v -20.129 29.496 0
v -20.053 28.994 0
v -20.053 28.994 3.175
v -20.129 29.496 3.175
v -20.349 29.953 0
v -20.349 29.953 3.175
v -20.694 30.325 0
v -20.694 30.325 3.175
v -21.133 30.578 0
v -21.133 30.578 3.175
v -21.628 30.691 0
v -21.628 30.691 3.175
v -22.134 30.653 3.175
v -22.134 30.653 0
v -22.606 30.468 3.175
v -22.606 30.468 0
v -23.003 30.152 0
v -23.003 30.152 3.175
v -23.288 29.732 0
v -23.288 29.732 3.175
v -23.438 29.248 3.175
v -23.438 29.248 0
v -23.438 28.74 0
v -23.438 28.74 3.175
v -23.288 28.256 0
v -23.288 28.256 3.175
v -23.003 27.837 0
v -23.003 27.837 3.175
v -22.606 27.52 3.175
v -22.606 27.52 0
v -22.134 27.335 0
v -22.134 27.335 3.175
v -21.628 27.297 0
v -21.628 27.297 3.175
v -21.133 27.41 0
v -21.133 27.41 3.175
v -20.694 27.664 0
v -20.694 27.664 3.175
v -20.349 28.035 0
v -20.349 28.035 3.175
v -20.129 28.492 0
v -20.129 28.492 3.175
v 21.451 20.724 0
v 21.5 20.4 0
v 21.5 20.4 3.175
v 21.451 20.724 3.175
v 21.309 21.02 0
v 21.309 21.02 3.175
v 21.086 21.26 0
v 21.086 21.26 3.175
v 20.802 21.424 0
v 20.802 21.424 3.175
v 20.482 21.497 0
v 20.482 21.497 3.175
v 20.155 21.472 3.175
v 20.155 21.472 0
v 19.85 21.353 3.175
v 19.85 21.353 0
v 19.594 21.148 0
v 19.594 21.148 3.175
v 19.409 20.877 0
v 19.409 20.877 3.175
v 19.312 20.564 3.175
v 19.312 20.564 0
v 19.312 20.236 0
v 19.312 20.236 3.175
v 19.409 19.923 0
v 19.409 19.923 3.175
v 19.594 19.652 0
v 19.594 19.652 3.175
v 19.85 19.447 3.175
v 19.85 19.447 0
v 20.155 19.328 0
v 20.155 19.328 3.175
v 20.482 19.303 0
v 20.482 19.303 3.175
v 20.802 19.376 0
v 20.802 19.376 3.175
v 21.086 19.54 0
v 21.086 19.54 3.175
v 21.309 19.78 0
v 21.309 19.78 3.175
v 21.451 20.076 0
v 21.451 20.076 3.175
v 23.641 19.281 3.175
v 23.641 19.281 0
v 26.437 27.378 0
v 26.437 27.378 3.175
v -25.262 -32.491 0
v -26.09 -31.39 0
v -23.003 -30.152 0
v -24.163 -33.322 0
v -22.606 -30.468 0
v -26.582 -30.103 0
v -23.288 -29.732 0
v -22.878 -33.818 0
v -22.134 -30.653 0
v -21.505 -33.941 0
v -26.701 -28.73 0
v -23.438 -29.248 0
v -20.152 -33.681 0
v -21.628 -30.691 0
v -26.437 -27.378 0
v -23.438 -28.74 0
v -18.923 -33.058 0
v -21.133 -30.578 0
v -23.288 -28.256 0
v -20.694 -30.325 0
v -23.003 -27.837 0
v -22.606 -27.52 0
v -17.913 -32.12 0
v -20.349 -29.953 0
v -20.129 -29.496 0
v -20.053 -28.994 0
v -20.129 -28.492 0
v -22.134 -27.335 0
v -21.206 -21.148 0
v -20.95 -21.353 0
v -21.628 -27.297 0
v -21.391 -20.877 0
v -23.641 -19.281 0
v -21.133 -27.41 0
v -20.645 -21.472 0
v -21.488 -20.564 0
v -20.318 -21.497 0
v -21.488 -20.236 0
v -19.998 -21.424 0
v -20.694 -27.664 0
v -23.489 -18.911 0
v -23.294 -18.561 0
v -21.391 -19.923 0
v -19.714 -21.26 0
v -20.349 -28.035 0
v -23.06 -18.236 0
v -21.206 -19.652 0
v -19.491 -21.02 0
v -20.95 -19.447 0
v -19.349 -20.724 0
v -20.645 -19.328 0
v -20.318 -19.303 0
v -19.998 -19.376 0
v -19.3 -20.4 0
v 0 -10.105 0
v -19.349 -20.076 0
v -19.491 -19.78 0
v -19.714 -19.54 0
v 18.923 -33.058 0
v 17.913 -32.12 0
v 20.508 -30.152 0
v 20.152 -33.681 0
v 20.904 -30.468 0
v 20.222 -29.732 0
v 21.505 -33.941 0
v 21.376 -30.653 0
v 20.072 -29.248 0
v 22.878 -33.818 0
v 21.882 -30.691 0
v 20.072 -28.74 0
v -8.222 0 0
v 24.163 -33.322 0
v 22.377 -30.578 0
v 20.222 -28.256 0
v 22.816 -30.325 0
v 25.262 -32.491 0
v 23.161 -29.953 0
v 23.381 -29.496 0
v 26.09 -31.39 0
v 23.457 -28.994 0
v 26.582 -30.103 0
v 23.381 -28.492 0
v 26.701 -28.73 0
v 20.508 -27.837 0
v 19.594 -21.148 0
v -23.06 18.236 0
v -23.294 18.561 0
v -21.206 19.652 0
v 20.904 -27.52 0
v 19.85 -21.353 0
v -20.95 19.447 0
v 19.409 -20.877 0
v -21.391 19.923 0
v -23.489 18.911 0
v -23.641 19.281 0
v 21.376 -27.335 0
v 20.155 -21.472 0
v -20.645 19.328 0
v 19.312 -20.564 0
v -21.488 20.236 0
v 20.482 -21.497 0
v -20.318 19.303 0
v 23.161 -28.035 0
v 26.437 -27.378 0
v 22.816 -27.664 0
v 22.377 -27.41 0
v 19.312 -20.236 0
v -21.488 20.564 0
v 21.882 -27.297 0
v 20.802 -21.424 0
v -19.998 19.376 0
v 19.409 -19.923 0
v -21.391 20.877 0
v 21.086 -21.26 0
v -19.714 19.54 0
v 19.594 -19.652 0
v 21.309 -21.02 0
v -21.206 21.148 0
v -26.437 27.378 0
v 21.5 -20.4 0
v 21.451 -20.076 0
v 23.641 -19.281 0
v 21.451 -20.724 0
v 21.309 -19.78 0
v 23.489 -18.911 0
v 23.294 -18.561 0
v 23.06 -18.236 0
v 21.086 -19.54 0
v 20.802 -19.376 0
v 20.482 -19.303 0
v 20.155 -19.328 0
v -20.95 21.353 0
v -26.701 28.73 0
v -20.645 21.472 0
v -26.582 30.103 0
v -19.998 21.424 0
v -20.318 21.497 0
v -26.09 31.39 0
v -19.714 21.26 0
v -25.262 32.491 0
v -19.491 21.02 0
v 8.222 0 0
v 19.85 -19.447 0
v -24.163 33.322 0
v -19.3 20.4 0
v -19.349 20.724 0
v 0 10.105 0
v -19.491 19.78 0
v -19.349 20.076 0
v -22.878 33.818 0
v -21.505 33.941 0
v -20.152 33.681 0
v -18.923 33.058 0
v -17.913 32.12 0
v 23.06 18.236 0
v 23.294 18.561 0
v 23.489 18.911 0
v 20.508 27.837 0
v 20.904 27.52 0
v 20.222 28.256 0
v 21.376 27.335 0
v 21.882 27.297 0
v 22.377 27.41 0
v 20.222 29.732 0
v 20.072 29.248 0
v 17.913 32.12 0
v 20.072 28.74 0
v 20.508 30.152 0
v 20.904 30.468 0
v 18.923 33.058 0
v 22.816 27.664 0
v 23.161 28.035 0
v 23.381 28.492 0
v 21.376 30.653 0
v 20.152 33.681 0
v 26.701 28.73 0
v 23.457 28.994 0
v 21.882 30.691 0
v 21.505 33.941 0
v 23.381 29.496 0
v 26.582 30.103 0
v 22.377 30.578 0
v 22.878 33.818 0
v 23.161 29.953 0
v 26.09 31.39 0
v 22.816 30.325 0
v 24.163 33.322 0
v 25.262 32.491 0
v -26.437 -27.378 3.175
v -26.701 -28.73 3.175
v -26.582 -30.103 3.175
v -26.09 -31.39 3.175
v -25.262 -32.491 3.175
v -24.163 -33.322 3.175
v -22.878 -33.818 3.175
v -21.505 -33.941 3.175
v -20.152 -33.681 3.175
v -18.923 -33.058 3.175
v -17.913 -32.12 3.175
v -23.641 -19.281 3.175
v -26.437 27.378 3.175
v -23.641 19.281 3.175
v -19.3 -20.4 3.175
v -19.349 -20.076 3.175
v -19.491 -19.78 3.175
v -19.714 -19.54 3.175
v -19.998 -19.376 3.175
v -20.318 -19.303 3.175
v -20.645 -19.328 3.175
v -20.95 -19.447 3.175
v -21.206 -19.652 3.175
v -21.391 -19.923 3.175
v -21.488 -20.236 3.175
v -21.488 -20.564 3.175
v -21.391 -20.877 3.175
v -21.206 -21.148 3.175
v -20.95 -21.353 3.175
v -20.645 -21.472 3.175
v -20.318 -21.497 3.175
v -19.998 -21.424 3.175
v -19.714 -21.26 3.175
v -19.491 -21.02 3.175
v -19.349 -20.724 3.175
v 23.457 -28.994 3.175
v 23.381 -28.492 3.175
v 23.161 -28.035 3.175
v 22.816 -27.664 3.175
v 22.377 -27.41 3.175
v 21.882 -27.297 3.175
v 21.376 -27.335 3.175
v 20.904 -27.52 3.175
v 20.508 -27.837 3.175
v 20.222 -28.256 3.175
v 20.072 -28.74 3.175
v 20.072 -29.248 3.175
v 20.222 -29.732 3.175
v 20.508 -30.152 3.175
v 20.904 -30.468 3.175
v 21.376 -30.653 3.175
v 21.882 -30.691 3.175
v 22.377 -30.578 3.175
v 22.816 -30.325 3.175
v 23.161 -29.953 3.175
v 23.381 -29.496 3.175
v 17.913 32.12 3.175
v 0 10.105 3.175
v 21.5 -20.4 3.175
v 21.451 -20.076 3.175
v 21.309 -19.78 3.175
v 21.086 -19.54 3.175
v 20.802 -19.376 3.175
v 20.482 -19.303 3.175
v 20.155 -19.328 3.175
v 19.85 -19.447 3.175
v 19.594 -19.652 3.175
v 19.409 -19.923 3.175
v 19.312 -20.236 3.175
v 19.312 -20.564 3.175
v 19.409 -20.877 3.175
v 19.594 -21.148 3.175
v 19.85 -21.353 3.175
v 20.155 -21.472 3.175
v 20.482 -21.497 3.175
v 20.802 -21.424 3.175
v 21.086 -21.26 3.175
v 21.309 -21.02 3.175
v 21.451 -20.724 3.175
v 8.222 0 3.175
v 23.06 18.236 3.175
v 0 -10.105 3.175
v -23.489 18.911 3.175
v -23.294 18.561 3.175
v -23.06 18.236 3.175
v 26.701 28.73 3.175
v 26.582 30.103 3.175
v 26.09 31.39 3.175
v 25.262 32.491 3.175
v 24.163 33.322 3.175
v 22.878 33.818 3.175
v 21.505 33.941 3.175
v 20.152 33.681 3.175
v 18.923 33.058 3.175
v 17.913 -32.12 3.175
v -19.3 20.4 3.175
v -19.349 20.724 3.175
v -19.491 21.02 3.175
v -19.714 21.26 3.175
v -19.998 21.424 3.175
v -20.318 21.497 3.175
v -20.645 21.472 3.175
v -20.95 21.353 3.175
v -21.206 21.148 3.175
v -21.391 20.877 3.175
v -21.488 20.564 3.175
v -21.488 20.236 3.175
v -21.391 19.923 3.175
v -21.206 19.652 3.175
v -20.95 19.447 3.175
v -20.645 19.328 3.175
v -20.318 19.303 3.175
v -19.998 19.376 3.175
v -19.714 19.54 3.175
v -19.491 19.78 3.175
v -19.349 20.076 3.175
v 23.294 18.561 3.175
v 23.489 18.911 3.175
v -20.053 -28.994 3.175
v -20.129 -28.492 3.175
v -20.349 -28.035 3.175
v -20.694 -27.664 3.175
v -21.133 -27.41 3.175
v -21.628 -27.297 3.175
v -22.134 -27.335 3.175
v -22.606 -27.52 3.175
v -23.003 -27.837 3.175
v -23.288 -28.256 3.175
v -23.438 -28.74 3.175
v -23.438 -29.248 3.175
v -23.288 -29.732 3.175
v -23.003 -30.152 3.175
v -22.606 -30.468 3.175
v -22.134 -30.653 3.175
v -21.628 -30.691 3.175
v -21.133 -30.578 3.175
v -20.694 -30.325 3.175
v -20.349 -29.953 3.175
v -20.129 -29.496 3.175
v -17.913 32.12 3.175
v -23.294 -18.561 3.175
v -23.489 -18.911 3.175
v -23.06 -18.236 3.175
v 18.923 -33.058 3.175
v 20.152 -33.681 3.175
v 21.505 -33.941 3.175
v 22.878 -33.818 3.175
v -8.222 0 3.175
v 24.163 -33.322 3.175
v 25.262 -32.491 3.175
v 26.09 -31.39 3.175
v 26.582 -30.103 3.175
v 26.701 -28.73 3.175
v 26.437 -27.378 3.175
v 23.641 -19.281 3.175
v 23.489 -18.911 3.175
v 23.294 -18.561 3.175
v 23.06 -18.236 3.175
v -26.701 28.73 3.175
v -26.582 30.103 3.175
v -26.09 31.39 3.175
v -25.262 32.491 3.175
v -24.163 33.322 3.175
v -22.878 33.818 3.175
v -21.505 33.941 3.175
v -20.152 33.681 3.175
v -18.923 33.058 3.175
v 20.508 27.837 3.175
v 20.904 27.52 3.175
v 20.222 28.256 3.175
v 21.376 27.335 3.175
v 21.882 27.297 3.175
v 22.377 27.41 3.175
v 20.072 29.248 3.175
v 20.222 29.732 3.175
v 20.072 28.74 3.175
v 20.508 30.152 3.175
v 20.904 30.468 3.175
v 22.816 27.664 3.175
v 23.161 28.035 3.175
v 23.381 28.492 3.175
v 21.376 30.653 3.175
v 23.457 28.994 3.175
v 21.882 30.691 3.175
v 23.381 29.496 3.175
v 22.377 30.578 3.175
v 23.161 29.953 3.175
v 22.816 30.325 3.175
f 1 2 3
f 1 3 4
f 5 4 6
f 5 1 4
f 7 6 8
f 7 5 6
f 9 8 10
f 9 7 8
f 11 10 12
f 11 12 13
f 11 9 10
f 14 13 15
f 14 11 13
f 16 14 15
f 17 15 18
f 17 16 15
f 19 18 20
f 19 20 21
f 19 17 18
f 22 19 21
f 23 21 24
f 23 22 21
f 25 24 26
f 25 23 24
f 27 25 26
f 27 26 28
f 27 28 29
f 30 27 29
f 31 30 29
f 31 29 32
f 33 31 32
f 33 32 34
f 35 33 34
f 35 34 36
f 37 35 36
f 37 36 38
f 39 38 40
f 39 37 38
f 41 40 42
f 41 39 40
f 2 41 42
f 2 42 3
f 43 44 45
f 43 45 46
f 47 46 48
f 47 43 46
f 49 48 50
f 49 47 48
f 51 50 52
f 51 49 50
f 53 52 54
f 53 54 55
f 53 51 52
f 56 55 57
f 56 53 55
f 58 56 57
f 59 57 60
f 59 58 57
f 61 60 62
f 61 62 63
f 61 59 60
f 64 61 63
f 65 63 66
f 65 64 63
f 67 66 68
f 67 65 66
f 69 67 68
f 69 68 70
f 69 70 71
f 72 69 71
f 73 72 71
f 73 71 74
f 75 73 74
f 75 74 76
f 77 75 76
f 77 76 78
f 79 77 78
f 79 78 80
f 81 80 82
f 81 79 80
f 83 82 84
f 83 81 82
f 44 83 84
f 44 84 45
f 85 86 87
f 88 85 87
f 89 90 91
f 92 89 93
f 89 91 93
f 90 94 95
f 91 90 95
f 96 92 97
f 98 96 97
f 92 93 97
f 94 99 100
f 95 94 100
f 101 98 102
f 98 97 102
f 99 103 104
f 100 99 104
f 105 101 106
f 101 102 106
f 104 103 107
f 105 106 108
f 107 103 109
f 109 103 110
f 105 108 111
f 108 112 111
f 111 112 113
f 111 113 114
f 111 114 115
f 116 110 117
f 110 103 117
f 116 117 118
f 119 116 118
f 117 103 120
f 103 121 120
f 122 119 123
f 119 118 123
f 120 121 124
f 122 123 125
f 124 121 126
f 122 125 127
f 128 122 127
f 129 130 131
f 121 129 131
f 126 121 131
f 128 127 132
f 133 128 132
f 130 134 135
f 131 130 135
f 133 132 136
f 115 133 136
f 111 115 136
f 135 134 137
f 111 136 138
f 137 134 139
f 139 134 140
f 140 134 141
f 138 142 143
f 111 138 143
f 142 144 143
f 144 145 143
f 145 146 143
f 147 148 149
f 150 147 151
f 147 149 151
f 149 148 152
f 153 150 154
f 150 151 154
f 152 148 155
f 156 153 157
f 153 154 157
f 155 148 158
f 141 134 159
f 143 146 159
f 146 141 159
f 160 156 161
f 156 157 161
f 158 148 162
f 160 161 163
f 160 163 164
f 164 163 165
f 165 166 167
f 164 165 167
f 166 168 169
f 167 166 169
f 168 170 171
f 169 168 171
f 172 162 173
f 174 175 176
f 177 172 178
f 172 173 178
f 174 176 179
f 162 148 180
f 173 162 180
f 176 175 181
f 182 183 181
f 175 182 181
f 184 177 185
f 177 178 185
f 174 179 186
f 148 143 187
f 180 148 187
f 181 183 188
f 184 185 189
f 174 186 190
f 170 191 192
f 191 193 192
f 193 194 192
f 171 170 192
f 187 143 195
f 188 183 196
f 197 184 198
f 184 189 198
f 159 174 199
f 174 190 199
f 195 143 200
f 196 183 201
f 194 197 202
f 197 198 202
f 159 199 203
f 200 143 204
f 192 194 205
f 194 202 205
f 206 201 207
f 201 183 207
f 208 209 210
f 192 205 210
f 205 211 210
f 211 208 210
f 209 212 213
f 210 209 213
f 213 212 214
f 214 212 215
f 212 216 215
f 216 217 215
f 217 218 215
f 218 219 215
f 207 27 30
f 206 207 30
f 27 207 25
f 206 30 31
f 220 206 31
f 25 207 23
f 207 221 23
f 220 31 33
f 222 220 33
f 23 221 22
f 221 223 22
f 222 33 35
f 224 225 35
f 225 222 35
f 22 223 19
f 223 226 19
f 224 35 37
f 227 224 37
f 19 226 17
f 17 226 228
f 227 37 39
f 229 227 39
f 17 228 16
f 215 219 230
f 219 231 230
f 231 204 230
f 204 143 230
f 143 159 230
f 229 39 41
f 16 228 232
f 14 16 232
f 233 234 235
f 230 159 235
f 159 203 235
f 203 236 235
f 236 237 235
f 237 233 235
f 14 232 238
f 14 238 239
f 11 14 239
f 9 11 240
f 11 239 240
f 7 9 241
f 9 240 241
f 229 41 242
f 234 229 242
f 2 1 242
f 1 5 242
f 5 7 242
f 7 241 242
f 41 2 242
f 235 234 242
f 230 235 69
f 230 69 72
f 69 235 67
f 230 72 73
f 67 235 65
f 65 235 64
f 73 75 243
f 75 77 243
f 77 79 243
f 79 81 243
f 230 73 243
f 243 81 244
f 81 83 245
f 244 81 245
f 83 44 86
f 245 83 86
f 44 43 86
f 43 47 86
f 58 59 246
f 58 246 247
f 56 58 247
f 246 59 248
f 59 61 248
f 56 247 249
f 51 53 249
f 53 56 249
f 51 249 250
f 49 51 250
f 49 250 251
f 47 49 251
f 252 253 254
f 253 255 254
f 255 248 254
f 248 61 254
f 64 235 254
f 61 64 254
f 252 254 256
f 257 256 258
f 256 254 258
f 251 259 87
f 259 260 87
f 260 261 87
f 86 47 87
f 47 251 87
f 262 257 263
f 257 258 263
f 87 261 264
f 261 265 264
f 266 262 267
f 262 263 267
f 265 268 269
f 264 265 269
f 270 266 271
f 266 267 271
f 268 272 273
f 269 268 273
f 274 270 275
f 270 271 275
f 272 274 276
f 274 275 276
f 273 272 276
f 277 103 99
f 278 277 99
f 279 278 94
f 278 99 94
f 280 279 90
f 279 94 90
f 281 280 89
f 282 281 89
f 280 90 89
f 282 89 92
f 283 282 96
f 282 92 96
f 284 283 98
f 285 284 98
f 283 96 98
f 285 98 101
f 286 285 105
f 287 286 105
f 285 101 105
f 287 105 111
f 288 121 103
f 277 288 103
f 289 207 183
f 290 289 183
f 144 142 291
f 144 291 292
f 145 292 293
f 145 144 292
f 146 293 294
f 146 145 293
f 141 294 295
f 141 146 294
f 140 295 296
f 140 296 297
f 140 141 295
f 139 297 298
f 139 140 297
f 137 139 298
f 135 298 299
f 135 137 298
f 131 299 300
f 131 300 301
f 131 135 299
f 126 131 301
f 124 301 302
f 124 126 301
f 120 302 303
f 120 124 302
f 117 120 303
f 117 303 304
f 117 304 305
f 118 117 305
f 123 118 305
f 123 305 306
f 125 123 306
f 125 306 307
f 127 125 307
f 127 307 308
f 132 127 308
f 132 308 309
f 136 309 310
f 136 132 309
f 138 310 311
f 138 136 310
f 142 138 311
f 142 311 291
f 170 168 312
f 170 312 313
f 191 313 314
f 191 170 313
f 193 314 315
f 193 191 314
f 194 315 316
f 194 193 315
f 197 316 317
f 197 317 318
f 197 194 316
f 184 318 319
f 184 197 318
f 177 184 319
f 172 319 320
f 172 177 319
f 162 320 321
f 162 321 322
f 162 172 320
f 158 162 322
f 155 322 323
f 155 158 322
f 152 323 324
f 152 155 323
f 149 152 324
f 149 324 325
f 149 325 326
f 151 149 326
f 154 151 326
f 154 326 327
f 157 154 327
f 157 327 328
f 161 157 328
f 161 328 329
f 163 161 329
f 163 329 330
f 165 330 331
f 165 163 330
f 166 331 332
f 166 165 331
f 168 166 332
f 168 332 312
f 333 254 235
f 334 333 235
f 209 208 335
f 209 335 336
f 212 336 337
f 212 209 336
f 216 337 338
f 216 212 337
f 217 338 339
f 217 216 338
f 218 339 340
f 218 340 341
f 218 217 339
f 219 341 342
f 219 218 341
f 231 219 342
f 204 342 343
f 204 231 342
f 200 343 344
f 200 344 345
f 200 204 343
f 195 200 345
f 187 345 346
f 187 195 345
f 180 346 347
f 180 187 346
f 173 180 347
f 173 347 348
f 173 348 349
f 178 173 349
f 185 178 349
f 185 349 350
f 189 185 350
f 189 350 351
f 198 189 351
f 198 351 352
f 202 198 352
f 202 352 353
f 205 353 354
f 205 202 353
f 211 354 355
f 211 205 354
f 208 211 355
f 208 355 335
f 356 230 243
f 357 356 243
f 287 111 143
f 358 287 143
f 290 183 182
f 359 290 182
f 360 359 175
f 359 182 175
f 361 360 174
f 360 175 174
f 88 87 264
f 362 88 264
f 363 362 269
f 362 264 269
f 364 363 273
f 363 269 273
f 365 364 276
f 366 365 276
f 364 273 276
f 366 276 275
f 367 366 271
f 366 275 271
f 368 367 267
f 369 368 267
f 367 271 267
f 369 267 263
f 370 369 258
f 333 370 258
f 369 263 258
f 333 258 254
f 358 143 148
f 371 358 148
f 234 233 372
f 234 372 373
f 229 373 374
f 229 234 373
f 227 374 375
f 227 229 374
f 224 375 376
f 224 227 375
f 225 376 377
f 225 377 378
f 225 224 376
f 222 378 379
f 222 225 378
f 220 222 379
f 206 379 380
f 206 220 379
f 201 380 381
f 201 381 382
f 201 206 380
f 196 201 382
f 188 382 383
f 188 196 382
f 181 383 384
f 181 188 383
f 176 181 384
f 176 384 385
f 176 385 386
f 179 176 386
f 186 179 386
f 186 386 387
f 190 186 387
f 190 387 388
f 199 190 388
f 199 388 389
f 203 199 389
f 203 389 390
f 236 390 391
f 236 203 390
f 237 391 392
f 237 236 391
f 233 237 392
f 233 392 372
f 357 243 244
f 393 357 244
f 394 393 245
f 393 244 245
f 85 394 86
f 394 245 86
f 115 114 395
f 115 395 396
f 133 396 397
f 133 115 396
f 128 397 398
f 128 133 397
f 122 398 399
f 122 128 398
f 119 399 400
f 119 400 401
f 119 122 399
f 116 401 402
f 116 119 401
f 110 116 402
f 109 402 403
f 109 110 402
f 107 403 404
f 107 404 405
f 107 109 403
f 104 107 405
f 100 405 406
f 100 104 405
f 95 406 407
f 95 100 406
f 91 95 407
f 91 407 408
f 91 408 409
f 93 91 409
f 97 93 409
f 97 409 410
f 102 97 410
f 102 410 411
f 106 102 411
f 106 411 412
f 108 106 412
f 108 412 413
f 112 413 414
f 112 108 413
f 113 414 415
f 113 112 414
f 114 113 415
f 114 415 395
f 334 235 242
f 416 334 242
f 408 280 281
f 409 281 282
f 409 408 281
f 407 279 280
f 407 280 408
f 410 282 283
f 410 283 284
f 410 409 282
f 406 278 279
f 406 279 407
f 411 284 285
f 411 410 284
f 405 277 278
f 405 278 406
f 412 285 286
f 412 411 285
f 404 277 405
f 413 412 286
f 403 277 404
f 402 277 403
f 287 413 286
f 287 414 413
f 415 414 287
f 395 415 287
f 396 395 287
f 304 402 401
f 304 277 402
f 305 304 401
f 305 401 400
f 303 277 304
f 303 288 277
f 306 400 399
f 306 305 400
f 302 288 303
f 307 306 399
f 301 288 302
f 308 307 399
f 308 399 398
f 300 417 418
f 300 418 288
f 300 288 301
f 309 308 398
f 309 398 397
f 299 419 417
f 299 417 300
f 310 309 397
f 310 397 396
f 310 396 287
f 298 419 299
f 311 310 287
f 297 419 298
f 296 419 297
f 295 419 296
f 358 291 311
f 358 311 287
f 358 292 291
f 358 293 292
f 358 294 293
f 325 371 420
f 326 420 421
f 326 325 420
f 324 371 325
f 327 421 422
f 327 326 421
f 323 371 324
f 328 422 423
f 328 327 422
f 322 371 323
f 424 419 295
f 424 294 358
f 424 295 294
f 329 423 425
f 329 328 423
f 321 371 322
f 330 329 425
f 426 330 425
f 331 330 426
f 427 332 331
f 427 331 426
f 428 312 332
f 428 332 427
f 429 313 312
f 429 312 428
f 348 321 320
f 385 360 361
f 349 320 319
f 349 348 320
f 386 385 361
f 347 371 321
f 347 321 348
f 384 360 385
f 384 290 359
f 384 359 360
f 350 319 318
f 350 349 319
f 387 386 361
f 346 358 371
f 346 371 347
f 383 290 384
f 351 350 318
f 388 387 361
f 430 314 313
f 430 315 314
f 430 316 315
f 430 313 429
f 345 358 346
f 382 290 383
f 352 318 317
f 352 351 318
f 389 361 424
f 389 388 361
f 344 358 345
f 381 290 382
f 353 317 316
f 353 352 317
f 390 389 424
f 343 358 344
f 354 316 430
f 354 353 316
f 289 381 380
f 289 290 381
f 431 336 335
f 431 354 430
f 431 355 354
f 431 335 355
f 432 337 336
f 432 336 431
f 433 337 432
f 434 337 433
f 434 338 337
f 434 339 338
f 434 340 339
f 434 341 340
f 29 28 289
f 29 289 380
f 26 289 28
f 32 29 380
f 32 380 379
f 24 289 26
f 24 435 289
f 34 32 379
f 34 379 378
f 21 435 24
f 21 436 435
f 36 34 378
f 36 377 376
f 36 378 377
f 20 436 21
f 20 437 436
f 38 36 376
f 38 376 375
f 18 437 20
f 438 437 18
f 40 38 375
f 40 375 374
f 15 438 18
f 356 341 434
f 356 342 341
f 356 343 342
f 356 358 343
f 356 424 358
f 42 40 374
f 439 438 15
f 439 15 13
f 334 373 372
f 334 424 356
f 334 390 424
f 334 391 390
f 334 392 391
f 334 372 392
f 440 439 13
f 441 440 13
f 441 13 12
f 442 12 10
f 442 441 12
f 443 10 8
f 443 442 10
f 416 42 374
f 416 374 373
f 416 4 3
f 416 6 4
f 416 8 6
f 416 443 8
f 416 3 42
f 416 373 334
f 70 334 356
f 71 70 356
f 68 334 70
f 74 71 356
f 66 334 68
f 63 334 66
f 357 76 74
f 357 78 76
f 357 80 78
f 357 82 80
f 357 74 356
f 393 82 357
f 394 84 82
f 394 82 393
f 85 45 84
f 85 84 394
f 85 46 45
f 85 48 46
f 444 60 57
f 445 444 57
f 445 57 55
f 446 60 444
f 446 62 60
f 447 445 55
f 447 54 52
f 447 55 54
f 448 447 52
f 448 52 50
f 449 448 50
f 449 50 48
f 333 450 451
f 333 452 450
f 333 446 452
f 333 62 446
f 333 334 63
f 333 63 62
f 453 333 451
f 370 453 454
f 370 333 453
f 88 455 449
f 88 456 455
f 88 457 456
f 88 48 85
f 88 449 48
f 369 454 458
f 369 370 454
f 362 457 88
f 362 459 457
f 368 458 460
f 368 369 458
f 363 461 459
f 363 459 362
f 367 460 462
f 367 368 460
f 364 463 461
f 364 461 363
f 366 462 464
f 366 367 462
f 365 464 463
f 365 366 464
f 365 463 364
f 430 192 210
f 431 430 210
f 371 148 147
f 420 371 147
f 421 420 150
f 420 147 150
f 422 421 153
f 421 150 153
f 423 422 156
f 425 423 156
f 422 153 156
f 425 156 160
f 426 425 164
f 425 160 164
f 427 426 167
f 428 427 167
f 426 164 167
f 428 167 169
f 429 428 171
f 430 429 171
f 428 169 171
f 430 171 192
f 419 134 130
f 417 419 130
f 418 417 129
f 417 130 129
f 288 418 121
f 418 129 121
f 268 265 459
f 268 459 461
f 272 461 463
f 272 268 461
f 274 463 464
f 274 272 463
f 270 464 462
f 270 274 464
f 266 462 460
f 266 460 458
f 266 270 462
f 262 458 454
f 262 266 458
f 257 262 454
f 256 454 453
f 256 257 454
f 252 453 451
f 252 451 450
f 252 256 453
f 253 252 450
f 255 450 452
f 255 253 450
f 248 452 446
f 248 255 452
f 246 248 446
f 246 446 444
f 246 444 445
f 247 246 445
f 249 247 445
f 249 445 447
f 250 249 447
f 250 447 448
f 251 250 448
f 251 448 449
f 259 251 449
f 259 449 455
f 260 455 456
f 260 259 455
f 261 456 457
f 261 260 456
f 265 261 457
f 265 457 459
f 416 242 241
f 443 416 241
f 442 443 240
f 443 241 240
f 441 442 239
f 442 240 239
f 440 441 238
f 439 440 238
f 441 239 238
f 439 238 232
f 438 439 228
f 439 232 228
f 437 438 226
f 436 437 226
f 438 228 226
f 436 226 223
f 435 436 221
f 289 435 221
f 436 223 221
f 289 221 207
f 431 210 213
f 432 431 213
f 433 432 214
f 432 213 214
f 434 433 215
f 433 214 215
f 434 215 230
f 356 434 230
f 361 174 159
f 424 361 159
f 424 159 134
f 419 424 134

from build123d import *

# Parameters (mm, degrees)
SKETCH1_R           = 1.7018
SKETCH1_R_2         = 1.1
BOSS_EXTRUDE1_DEPTH = 3.175


with BuildPart() as part:
    # Sketch1 → Boss-Extrude1 (new body)
    with BuildSketch(Plane.XY):
        with BuildLine():
            Line((-23.059785094, 18.235838692), (-8.221884337, 0))
            Line((-8.221884337, 0), (-23.059785094, -18.235838692))
            ThreePointArc((-23.059785094, -18.235838692), (-23.396423143, -18.732811969), (-23.641240585, -19.280874041))
            Line((-23.641240585, -19.280874041), (-26.436877512, -27.377570282))
            ThreePointArc((-26.436877512, -27.377570282), (-24.163274934, -33.322252318), (-17.913202642, -32.120125223))
            Line((-17.913202642, -32.120125223), (0, -10.104728355))
            Line((0, -10.104728355), (17.913202642, -32.120125223))
            ThreePointArc((17.913202642, -32.120125223), (24.163274934, -33.322252318), (26.436877512, -27.377570282))
            Line((26.436877512, -27.377570282), (23.641240585, -19.280874041))
            ThreePointArc((23.641240585, -19.280874041), (23.396423143, -18.732811969), (23.059785094, -18.235838692))
            Line((23.059785094, -18.235838692), (8.221884337, 0))
            Line((8.221884337, 0), (23.059785094, 18.235838692))
            ThreePointArc((23.059785094, 18.235838692), (23.396423143, 18.732811969), (23.641240585, 19.280874041))
            Line((23.641240585, 19.280874041), (26.436877512, 27.377570282))
            ThreePointArc((26.436877512, 27.377570282), (24.163274934, 33.322252318), (17.913202642, 32.120125223))
            Line((17.913202642, 32.120125223), (0, 10.104728355))
            Line((0, 10.104728355), (-17.913202642, 32.120125223))
            ThreePointArc((-17.913202642, 32.120125223), (-24.163274934, 33.322252318), (-26.436877512, 27.377570282))
            Line((-26.436877512, 27.377570282), (-23.641240585, 19.280874041))
            ThreePointArc((-23.641240585, 19.280874041), (-23.396423143, 18.732811969), (-23.059785094, 18.235838692))
        make_face()
        with Locations((21.7551, 28.9941)):
            Circle(SKETCH1_R, mode=Mode.SUBTRACT)
        with Locations((-21.7551, 28.9941)):
            Circle(SKETCH1_R, mode=Mode.SUBTRACT)
        with Locations((-21.7551, -28.9941)):
            Circle(SKETCH1_R, mode=Mode.SUBTRACT)
        with Locations((21.7551, -28.9941)):
            Circle(SKETCH1_R, mode=Mode.SUBTRACT)
        with Locations((20.40001, 20.40001)):
            Circle(SKETCH1_R_2, mode=Mode.SUBTRACT)
        with Locations((-20.40001, 20.40001)):
            Circle(SKETCH1_R_2, mode=Mode.SUBTRACT)
        with Locations((-20.40001, -20.40001)):
            Circle(SKETCH1_R_2, mode=Mode.SUBTRACT)
        with Locations((20.40001, -20.40001)):
            Circle(SKETCH1_R_2, mode=Mode.SUBTRACT)
    extrude(amount=BOSS_EXTRUDE1_DEPTH)


solid = part.part
